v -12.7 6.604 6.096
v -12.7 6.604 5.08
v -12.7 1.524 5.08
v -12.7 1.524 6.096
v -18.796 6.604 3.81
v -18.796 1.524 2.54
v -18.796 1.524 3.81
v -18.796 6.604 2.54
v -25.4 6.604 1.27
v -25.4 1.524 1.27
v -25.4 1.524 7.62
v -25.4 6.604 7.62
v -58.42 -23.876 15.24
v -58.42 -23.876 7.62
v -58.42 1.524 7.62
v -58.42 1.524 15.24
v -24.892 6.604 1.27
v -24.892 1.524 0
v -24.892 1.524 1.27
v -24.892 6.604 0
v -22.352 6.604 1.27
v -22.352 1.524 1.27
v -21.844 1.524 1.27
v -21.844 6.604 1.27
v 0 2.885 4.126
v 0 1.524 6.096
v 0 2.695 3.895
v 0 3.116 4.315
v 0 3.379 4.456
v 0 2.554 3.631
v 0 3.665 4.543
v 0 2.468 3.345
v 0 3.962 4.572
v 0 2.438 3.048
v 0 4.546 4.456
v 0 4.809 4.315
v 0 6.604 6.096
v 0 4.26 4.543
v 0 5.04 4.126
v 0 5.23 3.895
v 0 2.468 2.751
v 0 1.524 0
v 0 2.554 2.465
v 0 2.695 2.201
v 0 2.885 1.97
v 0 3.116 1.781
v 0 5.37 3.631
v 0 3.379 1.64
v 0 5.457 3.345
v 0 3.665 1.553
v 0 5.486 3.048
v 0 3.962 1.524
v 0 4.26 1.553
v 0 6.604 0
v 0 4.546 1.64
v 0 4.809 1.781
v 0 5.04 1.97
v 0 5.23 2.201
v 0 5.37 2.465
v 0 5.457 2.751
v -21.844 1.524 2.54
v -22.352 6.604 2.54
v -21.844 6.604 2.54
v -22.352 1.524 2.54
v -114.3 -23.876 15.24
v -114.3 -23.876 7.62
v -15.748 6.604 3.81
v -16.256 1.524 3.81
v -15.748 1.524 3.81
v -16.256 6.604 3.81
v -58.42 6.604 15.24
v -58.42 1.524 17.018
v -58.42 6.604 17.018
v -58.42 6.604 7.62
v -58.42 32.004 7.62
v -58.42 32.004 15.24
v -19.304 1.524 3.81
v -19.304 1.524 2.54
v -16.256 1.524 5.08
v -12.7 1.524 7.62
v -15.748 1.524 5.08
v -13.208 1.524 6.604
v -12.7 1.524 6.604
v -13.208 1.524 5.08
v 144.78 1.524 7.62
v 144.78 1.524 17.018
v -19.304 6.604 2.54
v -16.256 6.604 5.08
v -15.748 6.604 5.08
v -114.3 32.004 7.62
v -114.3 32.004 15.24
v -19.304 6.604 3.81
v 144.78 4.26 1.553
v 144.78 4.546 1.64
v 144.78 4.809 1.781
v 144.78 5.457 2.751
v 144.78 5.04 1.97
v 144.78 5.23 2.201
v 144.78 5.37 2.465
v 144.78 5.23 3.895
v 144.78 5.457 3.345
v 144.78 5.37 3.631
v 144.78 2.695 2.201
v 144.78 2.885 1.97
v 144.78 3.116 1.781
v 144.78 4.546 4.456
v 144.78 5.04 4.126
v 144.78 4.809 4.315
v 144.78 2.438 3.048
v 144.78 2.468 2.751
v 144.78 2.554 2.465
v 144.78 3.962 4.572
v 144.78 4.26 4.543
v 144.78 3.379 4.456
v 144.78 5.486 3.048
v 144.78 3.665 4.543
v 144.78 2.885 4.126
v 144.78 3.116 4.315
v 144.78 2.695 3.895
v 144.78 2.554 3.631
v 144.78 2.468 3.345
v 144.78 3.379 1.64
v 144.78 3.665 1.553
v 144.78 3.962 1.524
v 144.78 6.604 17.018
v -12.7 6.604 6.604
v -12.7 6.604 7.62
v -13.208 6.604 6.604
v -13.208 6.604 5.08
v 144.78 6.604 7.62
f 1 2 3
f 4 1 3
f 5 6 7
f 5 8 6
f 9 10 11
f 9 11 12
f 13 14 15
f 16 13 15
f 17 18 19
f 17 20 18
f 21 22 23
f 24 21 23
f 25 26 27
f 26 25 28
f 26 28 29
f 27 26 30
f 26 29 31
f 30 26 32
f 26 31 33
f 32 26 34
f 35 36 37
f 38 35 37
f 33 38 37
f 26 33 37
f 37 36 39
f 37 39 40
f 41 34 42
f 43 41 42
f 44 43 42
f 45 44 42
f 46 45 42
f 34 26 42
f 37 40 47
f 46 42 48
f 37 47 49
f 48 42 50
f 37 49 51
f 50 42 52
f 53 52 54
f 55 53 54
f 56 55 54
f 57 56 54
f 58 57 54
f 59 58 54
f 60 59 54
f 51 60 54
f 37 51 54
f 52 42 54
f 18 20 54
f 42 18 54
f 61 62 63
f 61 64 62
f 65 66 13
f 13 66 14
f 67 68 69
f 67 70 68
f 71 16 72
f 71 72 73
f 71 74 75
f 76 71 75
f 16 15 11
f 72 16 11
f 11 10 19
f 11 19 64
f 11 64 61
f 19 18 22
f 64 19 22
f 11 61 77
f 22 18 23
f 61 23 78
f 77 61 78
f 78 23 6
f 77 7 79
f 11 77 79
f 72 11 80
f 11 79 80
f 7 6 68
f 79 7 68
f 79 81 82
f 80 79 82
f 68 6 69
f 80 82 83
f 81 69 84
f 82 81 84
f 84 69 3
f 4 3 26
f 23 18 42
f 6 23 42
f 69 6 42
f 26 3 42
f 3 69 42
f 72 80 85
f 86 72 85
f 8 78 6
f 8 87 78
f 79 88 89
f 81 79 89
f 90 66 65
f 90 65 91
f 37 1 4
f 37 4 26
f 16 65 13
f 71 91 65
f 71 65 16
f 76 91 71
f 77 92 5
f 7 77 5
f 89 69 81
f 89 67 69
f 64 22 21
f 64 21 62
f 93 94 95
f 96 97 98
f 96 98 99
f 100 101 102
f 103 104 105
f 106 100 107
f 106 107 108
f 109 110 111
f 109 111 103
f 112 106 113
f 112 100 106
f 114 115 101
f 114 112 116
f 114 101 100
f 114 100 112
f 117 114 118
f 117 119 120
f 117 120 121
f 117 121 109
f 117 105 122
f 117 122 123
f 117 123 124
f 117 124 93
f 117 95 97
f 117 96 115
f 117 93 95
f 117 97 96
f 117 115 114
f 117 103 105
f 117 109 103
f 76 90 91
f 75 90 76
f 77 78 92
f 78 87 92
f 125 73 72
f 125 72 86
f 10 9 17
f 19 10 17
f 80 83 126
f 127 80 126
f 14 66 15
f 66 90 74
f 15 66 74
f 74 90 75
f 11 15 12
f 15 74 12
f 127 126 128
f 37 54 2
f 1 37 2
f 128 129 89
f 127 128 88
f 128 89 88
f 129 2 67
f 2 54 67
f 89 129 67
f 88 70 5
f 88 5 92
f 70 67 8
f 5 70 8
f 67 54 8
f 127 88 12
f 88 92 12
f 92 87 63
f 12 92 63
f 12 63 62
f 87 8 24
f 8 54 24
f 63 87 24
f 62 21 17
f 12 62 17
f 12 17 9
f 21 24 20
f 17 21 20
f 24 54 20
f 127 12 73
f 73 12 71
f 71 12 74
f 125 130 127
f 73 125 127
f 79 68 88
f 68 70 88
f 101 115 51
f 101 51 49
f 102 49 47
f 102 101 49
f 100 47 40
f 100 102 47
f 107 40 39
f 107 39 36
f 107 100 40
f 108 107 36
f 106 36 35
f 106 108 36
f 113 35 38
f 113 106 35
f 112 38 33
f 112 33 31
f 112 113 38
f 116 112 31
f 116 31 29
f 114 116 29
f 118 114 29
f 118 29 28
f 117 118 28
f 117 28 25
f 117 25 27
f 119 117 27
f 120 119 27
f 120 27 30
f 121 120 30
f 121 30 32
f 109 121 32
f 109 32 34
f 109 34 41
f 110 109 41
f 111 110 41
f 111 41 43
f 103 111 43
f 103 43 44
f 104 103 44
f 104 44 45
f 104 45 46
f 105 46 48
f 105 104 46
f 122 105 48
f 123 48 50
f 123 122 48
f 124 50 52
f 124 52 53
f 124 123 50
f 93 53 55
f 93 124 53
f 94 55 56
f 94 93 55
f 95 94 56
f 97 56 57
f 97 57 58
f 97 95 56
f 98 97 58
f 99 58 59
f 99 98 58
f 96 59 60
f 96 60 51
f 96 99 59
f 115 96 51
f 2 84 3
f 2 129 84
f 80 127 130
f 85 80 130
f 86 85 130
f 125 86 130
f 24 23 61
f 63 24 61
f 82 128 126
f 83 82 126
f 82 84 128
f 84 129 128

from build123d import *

# Parameters (mm, degrees)
F2_W      = 203.2
F2_H      = 5.08
F3_DEPTH  = 9.398
F0_W      = 12.7
F0_H      = 5.08
F12_DEPTH = 7.62
F11_W     = 0.508
F11_H     = 1.524
F11_H_2   = 1.27
F13_DEPTH = 2.54
F15_W     = 55.88
F15_H     = 55.88
F16_DEPTH = 7.62
F17_DEPTH = 6.096
F18_R     = 1.524


# Not quite as in the source:
# - a feature names something its author has since deleted; it is built from what else it names


with BuildPart() as f3:
    # F2 (on offset) → F3 (new body)
    with BuildSketch(Plane.XY.offset(7.62)):
        with Locations((43.18, 4.064)):
            Rectangle(F2_W, F2_H)
    extrude(amount=F3_DEPTH)

    # F0 (on Top) → F12 (join)
    with BuildSketch(Plane.XY):
        with Locations((-19.05, 4.064)):
            Rectangle(F0_W, F0_H)
    extrude(amount=F12_DEPTH)

    # F11 (on offset) → F13 (cut, symmetric)
    with BuildSketch(Plane.XZ.offset(-4.064)):
        with Locations((-12.954, 5.842)):
            Rectangle(F11_W, F11_H)
        with Locations((-25.146, 0.635)):
            Rectangle(F11_W, F11_H_2)
        with Locations((-19.05, 3.175)):
            Rectangle(F11_W, F11_H_2)
        with Locations((-16.002, 4.445)):
            Rectangle(F11_W, F11_H_2)
        with Locations((-22.098, 1.905)):
            Rectangle(F11_W, F11_H_2)
    extrude(amount=F13_DEPTH, both=True, mode=Mode.SUBTRACT)

    # F15 (on offset) → F16 (join)
    with BuildSketch(Plane.XY.offset(7.62)):
        with Locations((-86.36, 4.064)):
            Rectangle(F15_W, F15_H)
    extrude(amount=F16_DEPTH)

    # F0 (on Top) → F17 (join)
    with BuildSketch(Plane.XY):
        Polygon((-6.35, 1.524), (0, 1.524), (0, 6.604), (-12.7, 6.604), (-12.7, 1.524), align=None)
    extrude(amount=F17_DEPTH)

    # F21: sweep along a path in F20
    with BuildLine(Plane.XZ.offset(-3.9624)) as f21_path:
        Line((0, 3.048), (144.78, 3.048))
    # F18 (on Right) → F21 (sweep)
    with BuildSketch(Plane.YZ):
        with Locations((3.9624, 3.048)):
            Circle(F18_R)
    sweep(path=f21_path.line)


solid = f3.part
